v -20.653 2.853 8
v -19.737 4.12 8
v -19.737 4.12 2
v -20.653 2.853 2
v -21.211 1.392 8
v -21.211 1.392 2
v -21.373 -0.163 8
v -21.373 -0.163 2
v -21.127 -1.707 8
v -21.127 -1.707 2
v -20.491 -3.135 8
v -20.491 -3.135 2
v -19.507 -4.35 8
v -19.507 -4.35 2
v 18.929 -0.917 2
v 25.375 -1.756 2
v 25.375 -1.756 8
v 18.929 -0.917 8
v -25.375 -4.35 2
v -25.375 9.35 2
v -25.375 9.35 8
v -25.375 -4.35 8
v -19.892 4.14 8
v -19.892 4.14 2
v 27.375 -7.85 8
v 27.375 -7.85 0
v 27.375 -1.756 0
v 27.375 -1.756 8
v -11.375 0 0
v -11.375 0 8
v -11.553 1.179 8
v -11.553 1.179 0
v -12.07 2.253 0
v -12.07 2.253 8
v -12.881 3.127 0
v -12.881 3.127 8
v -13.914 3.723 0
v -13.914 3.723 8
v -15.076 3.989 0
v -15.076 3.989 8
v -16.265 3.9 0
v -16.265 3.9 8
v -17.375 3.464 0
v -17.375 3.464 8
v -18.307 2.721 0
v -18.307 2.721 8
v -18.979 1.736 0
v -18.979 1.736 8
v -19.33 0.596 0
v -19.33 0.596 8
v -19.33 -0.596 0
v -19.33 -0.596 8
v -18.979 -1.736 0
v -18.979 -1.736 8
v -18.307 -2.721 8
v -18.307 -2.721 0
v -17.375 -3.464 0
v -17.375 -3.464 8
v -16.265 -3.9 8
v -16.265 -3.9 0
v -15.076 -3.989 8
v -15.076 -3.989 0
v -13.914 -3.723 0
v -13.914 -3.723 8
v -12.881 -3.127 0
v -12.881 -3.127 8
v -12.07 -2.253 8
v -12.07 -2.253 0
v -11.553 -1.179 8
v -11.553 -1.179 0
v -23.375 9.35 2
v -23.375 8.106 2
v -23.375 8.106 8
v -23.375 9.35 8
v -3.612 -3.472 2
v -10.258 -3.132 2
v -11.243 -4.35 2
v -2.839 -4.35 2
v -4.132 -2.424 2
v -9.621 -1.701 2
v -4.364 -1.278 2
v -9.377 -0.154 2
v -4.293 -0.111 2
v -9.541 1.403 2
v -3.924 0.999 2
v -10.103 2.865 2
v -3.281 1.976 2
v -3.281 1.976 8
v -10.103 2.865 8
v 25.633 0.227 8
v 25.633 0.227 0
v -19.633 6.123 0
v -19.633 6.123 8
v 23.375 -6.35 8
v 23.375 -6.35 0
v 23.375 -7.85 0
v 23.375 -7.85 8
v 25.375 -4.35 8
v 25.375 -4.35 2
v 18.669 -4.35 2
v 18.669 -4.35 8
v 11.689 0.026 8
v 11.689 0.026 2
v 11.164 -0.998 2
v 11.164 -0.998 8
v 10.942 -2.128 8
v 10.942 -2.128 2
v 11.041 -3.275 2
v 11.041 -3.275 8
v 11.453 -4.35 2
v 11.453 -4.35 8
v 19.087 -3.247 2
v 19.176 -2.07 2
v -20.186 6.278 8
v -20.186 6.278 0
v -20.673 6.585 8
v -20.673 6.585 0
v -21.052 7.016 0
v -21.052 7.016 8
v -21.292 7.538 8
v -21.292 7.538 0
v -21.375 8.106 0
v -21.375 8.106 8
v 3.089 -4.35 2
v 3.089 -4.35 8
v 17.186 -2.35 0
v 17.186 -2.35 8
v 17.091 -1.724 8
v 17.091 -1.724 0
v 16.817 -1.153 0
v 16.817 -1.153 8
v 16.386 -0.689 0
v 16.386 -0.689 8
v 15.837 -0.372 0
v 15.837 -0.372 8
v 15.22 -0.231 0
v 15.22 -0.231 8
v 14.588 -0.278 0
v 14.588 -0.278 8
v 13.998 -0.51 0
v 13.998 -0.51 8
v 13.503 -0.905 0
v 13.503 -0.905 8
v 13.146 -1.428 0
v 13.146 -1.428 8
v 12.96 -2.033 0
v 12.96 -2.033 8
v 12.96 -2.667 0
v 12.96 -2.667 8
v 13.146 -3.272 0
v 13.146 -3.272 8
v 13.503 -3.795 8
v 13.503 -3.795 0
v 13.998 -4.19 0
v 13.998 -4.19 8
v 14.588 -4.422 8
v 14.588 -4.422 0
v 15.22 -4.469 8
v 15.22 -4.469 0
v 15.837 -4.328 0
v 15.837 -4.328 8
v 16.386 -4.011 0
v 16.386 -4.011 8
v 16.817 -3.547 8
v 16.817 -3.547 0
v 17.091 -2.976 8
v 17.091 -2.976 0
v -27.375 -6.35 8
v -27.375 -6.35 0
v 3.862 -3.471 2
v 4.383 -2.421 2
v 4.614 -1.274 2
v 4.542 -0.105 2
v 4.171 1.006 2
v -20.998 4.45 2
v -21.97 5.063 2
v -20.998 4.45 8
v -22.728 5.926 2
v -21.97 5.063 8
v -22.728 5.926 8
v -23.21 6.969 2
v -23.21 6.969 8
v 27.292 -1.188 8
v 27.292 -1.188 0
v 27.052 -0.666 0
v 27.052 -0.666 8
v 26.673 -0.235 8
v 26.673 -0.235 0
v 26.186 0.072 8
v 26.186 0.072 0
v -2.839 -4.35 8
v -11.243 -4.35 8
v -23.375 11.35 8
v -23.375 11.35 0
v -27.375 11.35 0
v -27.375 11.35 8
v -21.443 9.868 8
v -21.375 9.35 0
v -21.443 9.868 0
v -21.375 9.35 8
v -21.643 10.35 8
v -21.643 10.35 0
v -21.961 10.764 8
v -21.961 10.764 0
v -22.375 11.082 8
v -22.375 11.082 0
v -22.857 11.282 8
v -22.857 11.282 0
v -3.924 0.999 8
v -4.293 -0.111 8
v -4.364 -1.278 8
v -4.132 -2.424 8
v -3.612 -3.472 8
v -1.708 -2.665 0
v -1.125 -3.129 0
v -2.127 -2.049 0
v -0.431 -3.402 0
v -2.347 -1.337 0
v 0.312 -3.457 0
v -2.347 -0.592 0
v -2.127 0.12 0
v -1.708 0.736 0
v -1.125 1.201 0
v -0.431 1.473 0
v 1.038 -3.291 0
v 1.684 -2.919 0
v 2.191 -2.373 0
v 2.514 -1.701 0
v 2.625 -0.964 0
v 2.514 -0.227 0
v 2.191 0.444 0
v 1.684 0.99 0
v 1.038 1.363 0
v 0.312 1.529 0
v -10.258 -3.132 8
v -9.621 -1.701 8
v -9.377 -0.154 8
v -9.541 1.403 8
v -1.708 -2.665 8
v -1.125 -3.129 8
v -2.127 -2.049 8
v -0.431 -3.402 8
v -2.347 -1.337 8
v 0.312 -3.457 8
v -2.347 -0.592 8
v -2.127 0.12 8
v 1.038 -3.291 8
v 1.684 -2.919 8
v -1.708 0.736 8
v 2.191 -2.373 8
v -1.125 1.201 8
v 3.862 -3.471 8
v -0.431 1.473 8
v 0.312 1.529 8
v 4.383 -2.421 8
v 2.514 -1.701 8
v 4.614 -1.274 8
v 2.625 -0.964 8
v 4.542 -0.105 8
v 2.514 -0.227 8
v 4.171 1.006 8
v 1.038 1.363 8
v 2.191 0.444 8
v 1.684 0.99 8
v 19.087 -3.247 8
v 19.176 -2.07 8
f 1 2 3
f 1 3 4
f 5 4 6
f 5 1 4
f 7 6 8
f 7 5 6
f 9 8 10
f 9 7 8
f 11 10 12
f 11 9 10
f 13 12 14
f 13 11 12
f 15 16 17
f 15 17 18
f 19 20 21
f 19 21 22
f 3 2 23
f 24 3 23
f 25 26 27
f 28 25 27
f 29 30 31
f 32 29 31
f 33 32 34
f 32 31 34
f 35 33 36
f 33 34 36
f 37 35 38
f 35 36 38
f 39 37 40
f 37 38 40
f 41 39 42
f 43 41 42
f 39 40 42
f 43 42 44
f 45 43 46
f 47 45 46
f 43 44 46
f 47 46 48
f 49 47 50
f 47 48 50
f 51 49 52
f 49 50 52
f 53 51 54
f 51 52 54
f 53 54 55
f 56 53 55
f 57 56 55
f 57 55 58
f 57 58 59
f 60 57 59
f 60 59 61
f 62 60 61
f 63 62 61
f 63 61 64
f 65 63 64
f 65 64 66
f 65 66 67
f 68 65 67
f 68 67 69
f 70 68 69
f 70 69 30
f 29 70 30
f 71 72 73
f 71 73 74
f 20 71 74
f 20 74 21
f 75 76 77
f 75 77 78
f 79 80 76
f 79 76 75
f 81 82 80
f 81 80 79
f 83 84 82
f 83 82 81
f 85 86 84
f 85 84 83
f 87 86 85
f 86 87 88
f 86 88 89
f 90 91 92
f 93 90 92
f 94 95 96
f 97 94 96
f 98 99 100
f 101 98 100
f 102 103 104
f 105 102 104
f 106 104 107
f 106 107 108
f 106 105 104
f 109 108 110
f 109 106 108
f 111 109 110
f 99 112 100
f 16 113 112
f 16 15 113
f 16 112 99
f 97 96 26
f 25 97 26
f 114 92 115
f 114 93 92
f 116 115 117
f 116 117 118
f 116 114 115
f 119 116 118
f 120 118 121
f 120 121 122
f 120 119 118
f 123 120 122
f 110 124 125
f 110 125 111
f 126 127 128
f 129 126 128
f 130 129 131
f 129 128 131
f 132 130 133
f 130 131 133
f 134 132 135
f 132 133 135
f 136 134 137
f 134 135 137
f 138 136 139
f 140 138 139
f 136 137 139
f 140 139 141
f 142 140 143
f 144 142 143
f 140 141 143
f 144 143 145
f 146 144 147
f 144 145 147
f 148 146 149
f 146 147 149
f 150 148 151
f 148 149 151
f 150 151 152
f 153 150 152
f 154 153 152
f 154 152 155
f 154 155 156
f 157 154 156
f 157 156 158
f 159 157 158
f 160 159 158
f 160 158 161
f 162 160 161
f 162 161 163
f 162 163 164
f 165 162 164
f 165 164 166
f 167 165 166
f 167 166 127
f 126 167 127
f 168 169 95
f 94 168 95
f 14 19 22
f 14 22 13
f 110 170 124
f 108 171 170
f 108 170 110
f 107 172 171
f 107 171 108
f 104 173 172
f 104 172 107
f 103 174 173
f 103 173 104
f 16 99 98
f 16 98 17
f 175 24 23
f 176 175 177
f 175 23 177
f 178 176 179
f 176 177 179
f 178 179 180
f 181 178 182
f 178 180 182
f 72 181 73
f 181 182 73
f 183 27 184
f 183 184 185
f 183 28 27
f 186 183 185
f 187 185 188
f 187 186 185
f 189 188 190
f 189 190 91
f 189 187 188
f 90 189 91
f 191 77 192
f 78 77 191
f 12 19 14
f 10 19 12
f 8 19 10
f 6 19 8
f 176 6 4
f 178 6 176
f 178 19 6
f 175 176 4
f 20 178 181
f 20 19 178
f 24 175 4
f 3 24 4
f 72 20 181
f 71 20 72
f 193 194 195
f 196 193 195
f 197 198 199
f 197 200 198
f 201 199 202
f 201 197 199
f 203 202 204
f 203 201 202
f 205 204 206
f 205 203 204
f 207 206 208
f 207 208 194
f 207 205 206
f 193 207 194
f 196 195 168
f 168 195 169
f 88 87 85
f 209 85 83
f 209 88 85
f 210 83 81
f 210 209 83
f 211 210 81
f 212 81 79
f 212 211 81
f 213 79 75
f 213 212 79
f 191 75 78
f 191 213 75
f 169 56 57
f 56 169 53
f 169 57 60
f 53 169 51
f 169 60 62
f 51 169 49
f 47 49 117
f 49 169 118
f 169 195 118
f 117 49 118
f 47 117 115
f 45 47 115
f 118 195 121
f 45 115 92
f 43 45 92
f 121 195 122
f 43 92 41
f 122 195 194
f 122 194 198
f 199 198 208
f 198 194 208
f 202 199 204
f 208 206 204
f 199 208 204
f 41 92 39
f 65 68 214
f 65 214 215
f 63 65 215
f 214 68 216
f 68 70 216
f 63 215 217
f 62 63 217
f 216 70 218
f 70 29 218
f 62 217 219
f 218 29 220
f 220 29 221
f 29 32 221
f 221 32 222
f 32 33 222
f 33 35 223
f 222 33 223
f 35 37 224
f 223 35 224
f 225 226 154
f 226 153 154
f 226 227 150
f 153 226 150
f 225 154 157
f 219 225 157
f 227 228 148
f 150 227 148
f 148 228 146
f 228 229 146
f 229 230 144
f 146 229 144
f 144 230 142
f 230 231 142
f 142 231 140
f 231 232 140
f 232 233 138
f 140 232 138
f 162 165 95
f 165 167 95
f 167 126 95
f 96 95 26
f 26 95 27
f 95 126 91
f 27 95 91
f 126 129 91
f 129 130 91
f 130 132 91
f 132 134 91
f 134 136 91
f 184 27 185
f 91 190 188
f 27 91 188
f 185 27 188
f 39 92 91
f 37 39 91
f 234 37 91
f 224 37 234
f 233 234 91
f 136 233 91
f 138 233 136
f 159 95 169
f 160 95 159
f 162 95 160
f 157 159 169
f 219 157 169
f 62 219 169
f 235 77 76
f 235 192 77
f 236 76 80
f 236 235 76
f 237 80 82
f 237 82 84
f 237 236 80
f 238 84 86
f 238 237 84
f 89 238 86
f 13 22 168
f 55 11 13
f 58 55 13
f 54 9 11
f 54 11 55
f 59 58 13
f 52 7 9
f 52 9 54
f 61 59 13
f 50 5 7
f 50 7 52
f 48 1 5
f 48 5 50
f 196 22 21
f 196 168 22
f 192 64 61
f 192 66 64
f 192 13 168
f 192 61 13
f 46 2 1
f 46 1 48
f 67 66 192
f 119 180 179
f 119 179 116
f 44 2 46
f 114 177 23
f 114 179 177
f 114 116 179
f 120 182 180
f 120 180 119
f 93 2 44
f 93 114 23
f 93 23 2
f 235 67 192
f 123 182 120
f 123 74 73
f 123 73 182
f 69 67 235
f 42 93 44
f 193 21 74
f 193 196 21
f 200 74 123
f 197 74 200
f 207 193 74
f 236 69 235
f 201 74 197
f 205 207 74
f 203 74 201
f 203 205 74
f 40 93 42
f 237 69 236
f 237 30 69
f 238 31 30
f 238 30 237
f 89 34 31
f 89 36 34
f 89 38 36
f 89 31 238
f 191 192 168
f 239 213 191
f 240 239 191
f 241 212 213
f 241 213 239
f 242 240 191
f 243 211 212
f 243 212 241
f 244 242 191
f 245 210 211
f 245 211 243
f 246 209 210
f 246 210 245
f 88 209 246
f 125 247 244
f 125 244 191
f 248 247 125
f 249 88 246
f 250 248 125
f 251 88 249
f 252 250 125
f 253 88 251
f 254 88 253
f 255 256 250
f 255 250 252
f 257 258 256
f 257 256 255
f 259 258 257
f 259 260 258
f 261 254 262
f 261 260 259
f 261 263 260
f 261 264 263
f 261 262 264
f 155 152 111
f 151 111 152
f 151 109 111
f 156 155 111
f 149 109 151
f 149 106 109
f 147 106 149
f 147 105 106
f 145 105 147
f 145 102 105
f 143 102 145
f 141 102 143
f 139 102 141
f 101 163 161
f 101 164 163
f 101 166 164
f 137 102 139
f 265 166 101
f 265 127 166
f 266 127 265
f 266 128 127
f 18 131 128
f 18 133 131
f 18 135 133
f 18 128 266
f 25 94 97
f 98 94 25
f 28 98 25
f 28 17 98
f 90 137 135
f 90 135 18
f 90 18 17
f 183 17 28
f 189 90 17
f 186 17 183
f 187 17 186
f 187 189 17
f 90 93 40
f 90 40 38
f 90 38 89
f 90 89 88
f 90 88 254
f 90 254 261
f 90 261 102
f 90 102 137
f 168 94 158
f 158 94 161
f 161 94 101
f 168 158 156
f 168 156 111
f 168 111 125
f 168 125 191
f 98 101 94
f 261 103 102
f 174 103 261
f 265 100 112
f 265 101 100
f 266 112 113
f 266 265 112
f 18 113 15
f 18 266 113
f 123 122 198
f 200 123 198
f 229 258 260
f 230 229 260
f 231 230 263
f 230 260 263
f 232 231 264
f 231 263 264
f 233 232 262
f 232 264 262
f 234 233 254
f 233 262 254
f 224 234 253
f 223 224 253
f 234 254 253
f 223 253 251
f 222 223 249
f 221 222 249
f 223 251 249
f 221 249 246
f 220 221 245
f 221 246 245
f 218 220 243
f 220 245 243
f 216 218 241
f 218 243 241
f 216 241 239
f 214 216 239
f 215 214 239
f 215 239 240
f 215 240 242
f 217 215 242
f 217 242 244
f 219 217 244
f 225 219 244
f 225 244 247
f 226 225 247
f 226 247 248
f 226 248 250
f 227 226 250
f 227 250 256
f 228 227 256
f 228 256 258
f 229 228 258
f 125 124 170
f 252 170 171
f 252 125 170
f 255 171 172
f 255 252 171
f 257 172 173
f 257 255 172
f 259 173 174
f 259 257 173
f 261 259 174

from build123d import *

# Parameters (mm, degrees)
F1_DEPTH    = 8
F2_R        = 2
F3_R        = 4
F3_R_2      = 2.5
F3_R_3      = 2.125
F4_DEPTH    = 8.001
F5_T        = 2
F5_T3_DEPTH = 12


# Not quite as in the source:
# - a shell that OpenCascade refuses in one call is made with other operations: the cavity is built on its own and cut out


with BuildPart() as f1:
    # F0 (on Top) → F1 (new body)
    with BuildSketch(Plane.XY):
        Polygon((-27.375, -6.35), (23.375, -6.35), (23.375, -7.85), (27.375, -7.85), (27.375, -6.35), (27.375, 0), (-21.375, 6.35), (-21.375, 11.35), (-27.375, 11.35), (-27.375, 6.35), align=None)
    extrude(amount=F1_DEPTH)

    # F2
    f2_edges = [f1.edges().sort_by_distance(p)[0] for p in [
        (-21.375, 11.35, 4),
        (27.375, 0, 4),
        (-21.375, 6.35, 4),
    ]]
    fillet(f2_edges, radius=F2_R)

    # F3 (on face) → F4 (cut, through all)
    with BuildSketch(Plane.XY.offset(8)):
        with Locations((-15.375, 0)):
            Circle(F3_R)
        with Locations((0.125, -0.9643055964)):
            Circle(F3_R_2)
        with Locations((15.0608578937, -2.35)):
            Circle(F3_R_3)
    extrude(amount=-F4_DEPTH, mode=Mode.SUBTRACT)

    # F5: shell of thickness 2, made by hand


with BuildPart() as f5_core1:
    # F5_t2: copy of F1
    add(f1.part)

    # the walls: a layer under each face that stays
    f5_faces = [f5_core1.faces().sort_by_distance(p)[0] for p in [
        (27.375, -4.8031912743, 4),
        (25.375, -7.85, 4),
        (3, 3.175, 4),
        (23.375, -7.1, 4),
        (-20.8777742764, 6.7866592918, 4),
        (-2, -6.35, 4),
        (-21.375, 8.7281912743, 4),
        (-27.375, 2.5, 4),
        (-25.375, 11.35, 4),
        (-2.375, -0.9643055964, 4),
        (12.9358578937, -2.35, 4),
        (-19.375, 0, 4),
        (0, 1.75, 0),
    ]]
    thicken(f5_faces, amount=-F5_T, mode=Mode.SUBTRACT)

    # F5_s4 → F5_t3 (cut)
    with BuildSketch(Plane.XY.offset(-2)):
        Polygon((23.355, -6.37), (25.375, -6.35), (25.375, -4.35), (23.375, -4.35), align=None)
    extrude(amount=F5_T3_DEPTH, mode=Mode.SUBTRACT)


with BuildPart() as f1_1:
    add(f1.part)

    # what is left inside the walls is the cavity
    f5_cavity = [f5_core1.part.solids().sort_by_distance(p)[0] for p in [
        (22.021788, -4.33, 6),
        (7.27122, -4.33, 6),
        (-25.355, 2.5, 6),
        (-7.040903, -4.33, 6),
    ]]
    add(f5_cavity, mode=Mode.SUBTRACT)


solid = f1_1.part
